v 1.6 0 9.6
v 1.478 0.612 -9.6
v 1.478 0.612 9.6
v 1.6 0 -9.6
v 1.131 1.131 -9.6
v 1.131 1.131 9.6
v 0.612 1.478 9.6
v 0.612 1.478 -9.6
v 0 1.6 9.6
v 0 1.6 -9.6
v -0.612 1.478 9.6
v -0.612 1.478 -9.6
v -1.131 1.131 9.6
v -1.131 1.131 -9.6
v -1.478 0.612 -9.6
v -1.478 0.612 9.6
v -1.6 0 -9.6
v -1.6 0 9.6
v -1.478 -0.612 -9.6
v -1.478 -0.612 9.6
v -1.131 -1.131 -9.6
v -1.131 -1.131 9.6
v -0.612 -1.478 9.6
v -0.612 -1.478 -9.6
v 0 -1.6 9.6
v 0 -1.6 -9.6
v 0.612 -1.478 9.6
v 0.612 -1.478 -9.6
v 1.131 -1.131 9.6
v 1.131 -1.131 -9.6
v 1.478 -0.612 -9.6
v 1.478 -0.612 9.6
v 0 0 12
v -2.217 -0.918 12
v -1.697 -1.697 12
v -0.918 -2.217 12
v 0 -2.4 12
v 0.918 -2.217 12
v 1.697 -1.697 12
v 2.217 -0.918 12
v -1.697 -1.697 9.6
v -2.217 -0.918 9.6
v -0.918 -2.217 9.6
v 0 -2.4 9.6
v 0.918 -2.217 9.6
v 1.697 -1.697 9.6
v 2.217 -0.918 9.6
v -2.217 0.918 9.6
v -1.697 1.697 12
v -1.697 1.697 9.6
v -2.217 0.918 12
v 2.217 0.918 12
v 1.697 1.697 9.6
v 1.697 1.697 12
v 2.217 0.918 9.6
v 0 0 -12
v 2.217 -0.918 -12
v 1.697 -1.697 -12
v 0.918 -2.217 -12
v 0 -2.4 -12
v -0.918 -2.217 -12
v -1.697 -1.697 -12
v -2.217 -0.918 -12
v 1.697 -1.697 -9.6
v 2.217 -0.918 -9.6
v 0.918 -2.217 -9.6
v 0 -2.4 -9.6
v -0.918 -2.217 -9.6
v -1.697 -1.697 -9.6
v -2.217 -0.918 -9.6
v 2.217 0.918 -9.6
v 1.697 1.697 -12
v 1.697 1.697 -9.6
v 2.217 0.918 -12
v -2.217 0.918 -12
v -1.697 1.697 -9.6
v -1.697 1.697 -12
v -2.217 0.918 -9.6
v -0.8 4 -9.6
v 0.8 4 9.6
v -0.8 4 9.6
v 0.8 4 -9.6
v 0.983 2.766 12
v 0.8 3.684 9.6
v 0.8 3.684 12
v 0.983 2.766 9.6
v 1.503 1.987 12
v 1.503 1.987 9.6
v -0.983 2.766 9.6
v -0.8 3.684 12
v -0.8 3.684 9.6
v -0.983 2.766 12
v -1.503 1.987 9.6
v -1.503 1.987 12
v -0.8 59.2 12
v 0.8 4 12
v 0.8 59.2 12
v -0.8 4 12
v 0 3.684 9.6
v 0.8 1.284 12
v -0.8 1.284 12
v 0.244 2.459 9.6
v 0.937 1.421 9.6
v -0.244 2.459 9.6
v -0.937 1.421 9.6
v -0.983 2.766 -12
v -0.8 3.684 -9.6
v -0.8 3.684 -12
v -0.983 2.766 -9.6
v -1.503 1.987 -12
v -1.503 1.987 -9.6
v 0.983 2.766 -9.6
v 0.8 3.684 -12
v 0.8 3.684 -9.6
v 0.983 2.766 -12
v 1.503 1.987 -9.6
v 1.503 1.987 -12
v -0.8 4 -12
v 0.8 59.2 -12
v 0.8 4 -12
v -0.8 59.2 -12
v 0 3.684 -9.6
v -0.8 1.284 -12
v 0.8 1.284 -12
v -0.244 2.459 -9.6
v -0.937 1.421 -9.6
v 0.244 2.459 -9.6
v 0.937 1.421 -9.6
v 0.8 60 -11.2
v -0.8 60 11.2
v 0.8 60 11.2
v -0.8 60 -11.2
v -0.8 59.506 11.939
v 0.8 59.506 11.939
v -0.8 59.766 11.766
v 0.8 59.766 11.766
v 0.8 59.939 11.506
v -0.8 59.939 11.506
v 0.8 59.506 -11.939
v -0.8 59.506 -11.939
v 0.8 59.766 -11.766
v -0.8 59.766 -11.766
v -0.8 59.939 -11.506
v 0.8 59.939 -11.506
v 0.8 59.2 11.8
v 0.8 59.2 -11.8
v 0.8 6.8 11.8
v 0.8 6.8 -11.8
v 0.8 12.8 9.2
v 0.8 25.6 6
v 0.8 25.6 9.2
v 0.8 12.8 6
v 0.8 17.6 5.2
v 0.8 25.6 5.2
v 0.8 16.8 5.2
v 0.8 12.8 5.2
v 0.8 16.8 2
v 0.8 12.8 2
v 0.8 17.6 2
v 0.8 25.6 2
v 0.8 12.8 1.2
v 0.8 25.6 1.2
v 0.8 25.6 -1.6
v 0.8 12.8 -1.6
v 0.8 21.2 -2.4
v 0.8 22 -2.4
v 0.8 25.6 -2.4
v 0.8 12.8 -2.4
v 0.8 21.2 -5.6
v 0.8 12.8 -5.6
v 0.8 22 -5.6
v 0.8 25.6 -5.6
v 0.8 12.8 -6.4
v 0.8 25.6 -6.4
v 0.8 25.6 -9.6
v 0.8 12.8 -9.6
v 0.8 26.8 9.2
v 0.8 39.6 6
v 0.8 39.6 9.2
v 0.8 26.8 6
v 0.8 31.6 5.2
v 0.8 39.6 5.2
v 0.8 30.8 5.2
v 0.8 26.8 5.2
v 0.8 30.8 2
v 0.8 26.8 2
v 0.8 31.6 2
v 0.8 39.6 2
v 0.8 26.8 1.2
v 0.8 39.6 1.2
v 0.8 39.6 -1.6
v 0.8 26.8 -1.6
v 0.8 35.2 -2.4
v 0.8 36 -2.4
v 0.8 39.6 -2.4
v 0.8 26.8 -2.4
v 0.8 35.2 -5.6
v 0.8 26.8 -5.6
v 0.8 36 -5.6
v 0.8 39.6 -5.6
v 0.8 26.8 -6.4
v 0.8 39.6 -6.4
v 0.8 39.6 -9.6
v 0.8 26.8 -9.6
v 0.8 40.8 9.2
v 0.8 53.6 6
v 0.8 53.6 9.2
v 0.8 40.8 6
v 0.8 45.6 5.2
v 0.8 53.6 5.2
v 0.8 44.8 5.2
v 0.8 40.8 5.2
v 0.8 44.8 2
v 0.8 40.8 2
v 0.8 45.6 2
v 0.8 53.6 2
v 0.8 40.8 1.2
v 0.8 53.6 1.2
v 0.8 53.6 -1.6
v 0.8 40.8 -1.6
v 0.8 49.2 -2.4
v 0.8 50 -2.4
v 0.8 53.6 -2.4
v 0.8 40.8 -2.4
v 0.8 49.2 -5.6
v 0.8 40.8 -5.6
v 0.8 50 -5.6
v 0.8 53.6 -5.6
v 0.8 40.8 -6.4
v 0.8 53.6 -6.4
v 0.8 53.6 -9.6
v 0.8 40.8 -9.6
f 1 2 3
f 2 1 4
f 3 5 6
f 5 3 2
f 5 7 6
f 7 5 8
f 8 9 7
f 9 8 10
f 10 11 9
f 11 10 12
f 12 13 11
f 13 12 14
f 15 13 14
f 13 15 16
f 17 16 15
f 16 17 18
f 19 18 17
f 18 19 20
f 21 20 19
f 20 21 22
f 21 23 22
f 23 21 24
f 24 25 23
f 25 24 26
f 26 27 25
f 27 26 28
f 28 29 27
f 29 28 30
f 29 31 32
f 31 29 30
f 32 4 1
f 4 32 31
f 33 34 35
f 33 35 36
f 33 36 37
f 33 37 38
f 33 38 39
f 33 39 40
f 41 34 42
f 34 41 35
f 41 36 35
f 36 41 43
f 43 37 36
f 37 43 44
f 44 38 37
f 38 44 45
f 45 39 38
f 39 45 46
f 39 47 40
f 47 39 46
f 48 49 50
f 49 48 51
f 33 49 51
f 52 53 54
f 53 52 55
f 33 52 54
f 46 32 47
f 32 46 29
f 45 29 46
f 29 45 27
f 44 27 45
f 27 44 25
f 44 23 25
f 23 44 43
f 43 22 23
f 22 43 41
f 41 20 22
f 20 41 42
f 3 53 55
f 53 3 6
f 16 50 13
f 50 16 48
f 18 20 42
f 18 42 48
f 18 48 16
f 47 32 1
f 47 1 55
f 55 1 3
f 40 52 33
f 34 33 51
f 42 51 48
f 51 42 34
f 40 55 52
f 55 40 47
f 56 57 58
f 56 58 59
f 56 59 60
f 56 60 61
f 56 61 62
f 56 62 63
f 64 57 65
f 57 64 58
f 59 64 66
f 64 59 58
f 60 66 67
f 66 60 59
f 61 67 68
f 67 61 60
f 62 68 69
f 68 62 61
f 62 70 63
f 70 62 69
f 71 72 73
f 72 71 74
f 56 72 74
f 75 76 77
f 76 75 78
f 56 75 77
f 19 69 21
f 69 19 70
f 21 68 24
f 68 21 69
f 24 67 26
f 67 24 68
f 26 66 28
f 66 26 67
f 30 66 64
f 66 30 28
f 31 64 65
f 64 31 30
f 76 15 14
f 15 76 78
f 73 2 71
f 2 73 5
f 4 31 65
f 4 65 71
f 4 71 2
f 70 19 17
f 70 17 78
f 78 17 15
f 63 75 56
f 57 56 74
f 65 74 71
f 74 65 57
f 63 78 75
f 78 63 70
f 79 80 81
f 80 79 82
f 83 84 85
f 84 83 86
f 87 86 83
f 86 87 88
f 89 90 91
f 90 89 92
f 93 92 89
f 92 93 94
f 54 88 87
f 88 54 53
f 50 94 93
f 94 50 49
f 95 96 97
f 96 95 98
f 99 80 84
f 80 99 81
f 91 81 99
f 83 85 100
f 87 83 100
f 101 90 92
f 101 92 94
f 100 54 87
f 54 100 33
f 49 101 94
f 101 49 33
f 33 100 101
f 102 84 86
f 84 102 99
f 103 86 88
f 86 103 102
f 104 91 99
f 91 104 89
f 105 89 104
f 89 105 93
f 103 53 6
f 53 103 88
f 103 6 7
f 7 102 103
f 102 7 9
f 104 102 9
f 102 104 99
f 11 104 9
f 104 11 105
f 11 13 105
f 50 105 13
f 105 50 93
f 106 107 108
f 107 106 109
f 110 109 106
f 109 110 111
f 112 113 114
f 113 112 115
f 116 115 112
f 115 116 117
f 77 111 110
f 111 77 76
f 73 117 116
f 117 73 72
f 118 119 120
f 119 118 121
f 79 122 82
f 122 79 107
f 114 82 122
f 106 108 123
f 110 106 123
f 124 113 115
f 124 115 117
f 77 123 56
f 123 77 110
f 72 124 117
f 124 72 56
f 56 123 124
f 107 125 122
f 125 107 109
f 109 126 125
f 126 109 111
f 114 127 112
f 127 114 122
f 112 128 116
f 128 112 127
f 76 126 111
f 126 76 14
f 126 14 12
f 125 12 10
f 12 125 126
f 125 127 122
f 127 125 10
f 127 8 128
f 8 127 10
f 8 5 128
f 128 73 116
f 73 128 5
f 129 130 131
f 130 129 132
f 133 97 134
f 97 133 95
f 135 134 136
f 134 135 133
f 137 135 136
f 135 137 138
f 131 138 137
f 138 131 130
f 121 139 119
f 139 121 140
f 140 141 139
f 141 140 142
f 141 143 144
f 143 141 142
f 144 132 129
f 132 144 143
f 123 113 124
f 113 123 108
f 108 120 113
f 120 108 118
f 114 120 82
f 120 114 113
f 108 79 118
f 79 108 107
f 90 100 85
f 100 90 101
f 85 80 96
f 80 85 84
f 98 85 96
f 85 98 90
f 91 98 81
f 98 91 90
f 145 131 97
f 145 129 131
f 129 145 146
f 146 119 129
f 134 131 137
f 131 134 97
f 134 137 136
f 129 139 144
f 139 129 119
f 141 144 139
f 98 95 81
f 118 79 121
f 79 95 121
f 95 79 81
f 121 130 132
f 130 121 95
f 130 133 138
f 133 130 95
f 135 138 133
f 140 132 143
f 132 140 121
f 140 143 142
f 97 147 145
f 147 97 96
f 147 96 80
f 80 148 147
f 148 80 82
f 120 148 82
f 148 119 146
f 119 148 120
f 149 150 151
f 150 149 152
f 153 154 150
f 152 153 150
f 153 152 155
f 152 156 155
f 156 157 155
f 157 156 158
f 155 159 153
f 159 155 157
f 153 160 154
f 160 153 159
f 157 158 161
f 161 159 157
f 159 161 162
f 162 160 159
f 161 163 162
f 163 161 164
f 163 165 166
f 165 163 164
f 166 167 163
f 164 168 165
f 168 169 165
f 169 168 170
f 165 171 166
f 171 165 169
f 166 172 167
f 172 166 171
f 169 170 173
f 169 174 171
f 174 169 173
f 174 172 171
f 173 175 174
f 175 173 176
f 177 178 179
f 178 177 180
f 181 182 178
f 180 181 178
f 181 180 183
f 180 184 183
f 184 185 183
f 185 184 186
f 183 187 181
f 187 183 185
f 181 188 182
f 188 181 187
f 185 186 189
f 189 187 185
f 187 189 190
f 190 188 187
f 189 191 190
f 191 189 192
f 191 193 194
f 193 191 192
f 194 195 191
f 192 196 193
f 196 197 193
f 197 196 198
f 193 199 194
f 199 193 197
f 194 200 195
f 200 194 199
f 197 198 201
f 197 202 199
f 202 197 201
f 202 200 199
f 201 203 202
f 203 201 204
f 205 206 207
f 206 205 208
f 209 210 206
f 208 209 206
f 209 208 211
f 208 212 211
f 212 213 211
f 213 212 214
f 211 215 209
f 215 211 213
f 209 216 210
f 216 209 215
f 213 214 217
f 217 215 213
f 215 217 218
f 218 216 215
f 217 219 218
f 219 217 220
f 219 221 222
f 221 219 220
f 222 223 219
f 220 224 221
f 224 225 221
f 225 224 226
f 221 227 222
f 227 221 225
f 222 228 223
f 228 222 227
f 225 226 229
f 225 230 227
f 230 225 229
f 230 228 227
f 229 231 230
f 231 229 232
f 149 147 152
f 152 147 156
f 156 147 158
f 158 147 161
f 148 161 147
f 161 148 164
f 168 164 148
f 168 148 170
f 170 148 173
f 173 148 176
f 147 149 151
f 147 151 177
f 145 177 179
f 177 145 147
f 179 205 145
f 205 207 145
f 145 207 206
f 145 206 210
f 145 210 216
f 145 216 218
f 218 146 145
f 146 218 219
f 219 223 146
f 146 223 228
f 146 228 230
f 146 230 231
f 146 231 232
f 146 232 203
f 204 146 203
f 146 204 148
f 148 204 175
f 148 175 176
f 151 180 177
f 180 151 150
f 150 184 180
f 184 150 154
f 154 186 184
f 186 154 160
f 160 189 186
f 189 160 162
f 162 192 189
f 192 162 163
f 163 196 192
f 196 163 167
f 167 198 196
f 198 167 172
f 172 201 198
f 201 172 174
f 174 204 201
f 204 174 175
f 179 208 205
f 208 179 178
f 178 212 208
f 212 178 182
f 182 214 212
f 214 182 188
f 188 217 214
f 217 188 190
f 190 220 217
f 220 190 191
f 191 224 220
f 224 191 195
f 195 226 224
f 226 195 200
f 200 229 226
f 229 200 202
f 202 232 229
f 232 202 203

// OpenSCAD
use <../lib.scad>
use <../p/1-4chrd.scad>
use <s/35252p02s01.scad>
use <s/35252s01.scad>
function ldraw_lib__35252p02() = [
// 0 Flag  8 x  3 with Rod without Reinforced Base and Flat Sides with Metallic Gold Solar Panel Pattern
// 0 Name: 35252p02.dat
// 0 Author: Vincent Messenet [Cheenzo]
// 0 !LDRAW_ORG Part UPDATE 2024-03
// 0 !LICENSE Licensed under CC BY 4.0 : see CAreadme.txt
// 
// 0 BFC CERTIFY CCW
  [0,"BFC","CERTIFY"],
  [0,"BFC","CCW"],
// 
// 0 !KEYWORDS BrickLink 30292pb053, Brickowl 95840, Lunar Space Station
// 0 !KEYWORDS Rebrickable 30292pr9997, Set 60336, Set 60349
// 
// 0 !HISTORY 2024-04-28 [OrionP] Official Update 2024-03
// 
// 
// 1 16 0 0 0 1 0 0 0 1 0 0 0 1 s\35252s01.dat
  [1,16,0,0,0,1,0,0,0,1,0,0,0,1, ldraw_lib__s__35252s01()],
// 
// 3 16 2 -29.5 148 2 -28 150 2 -30 148
  [3,16,2,-29.5,148,2,-28,150,2,-30,148],
// 4 16 2 28 150 2 -28 150 2 -29.5 148 2 29.5 148
  [4,16,2,28,150,2,-28,150,2,-29.5,148,2,29.5,148],
// 3 16 2 29.5 148 2 30 148 2 28 150
  [3,16,2,29.5,148,2,30,148,2,28,150],
// 1 16 2 -28 148 0 -1 0 -2 0 0 0 0 2 1-4chrd.dat
  [1,16,2,-28,148,0,-1,0,-2,0,0,0,0,2, ldraw_lib__1_4chrd()],
// 1 16 2 28 148 0 -1 0 2 0 0 0 0 2 1-4chrd.dat
  [1,16,2,28,148,0,-1,0,2,0,0,0,0,2, ldraw_lib__1_4chrd()],
// 
// 3 16 -2 -30 10 -2 -30 148 -2 -24 10
  [3,16,-2,-30,10,-2,-30,148,-2,-24,10],
// 3 16 -2 30 10 -2 24 10 -2 30 148
  [3,16,-2,30,10,-2,24,10,-2,30,148],
// 4 16 -2 -30 148 -2 30 148 -2 24 10 -2 -24 10
  [4,16,-2,-30,148,-2,30,148,-2,24,10,-2,-24,10],
// 4 16 -2 -30 148 -2 -28 150 -2 28 150 -2 30 148
  [4,16,-2,-30,148,-2,-28,150,-2,28,150,-2,30,148],
// 1 16 -2 -28 148 0 1 0 -2 0 0 0 0 2 1-4chrd.dat
  [1,16,-2,-28,148,0,1,0,-2,0,0,0,0,2, ldraw_lib__1_4chrd()],
// 1 16 -2 28 148 0 1 0 2 0 0 0 0 2 1-4chrd.dat
  [1,16,-2,28,148,0,1,0,2,0,0,0,0,2, ldraw_lib__1_4chrd()],
// 
// 4 16 2 -29.5 17 2 -29.5 148 2 -30 148 2 -30 10
  [4,16,2,-29.5,17,2,-29.5,148,2,-30,148,2,-30,10],
// 3 16 2 -29.5 17 2 -30 10 2 -24 10
  [3,16,2,-29.5,17,2,-30,10,2,-24,10],
// 4 16 2 -29.5 17 2 -24 10 2 24 10 2 29.5 17
  [4,16,2,-29.5,17,2,-24,10,2,24,10,2,29.5,17],
// 3 16 2 30 10 2 29.5 17 2 24 10
  [3,16,2,30,10,2,29.5,17,2,24,10],
// 4 16 2 30 148 2 29.5 148 2 29.5 17 2 30 10
  [4,16,2,30,148,2,29.5,148,2,29.5,17,2,30,10],
// 
// 1 16 2 -23 32 1 0 0 0 1 0 0 0 1 s\35252p02s01.dat
  [1,16,2,-23,32,1,0,0,0,1,0,0,0,1, ldraw_lib__s__35252p02s01()],
// 1 16 2 -23 67 1 0 0 0 1 0 0 0 1 s\35252p02s01.dat
  [1,16,2,-23,67,1,0,0,0,1,0,0,0,1, ldraw_lib__s__35252p02s01()],
// 1 16 2 -23 102 1 0 0 0 1 0 0 0 1 s\35252p02s01.dat
  [1,16,2,-23,102,1,0,0,0,1,0,0,0,1, ldraw_lib__s__35252p02s01()],
// 3 82 2 -23 32 2 -29.5 17 2 -15 32
  [3,82,2,-23,32,2,-29.5,17,2,-15,32],
// 3 82 2 -15 32 2 -29.5 17 2 -13 32
  [3,82,2,-15,32,2,-29.5,17,2,-13,32],
// 3 82 2 -13 32 2 -29.5 17 2 -5 32
  [3,82,2,-13,32,2,-29.5,17,2,-5,32],
// 3 82 2 -5 32 2 -29.5 17 2 -3 32
  [3,82,2,-5,32,2,-29.5,17,2,-3,32],
// 4 82 2 4 32 2 -3 32 2 -29.5 17 2 29.5 17
  [4,82,2,4,32,2,-3,32,2,-29.5,17,2,29.5,17],
// 3 82 2 6 32 2 4 32 2 29.5 17
  [3,82,2,6,32,2,4,32,2,29.5,17],
// 3 82 2 6 32 2 29.5 17 2 14 32
  [3,82,2,6,32,2,29.5,17,2,14,32],
// 3 82 2 14 32 2 29.5 17 2 16 32
  [3,82,2,14,32,2,29.5,17,2,16,32],
// 3 82 2 16 32 2 29.5 17 2 24 32
  [3,82,2,16,32,2,29.5,17,2,24,32],
// 3 82 2 -29.5 17 2 -23 32 2 -23 64
  [3,82,2,-29.5,17,2,-23,32,2,-23,64],
// 3 82 2 -29.5 17 2 -23 64 2 -23 67
  [3,82,2,-29.5,17,2,-23,64,2,-23,67],
// 4 82 2 -29.5 17 2 -23 67 2 -23 99 2 -29.5 148
  [4,82,2,-29.5,17,2,-23,67,2,-23,99,2,-29.5,148],
// 3 82 2 -23 99 2 -23 102 2 -29.5 148
  [3,82,2,-23,99,2,-23,102,2,-29.5,148],
// 3 82 2 -23 102 2 -23 134 2 -29.5 148
  [3,82,2,-23,102,2,-23,134,2,-29.5,148],
// 3 82 2 -29.5 148 2 -23 134 2 -15 134
  [3,82,2,-29.5,148,2,-23,134,2,-15,134],
// 3 82 2 -29.5 148 2 -15 134 2 -13 134
  [3,82,2,-29.5,148,2,-15,134,2,-13,134],
// 3 82 2 -29.5 148 2 -13 134 2 -5 134
  [3,82,2,-29.5,148,2,-13,134,2,-5,134],
// 3 82 2 -29.5 148 2 -5 134 2 -3 134
  [3,82,2,-29.5,148,2,-5,134,2,-3,134],
// 4 82 2 -29.5 148 2 -3 134 2 4 134 2 29.5 148
  [4,82,2,-29.5,148,2,-3,134,2,4,134,2,29.5,148],
// 3 82 2 4 134 2 6 134 2 29.5 148
  [3,82,2,4,134,2,6,134,2,29.5,148],
// 3 82 2 29.5 148 2 6 134 2 14 134
  [3,82,2,29.5,148,2,6,134,2,14,134],
// 3 82 2 29.5 148 2 14 134 2 16 134
  [3,82,2,29.5,148,2,14,134,2,16,134],
// 3 82 2 29.5 148 2 16 134 2 24 134
  [3,82,2,29.5,148,2,16,134,2,24,134],
// 3 82 2 29.5 148 2 24 134 2 24 102
  [3,82,2,29.5,148,2,24,134,2,24,102],
// 3 82 2 29.5 148 2 24 102 2 24 99
  [3,82,2,29.5,148,2,24,102,2,24,99],
// 4 82 2 29.5 148 2 24 99 2 24 67 2 29.5 17
  [4,82,2,29.5,148,2,24,99,2,24,67,2,29.5,17],
// 3 82 2 29.5 17 2 24 67 2 24 64
  [3,82,2,29.5,17,2,24,67,2,24,64],
// 3 82 2 29.5 17 2 24 64 2 24 32
  [3,82,2,29.5,17,2,24,64,2,24,32],
// 4 82 2 -15 67 2 -23 67 2 -23 64 2 -15 64
  [4,82,2,-15,67,2,-23,67,2,-23,64,2,-15,64],
// 4 82 2 -15 67 2 -15 64 2 -13 64 2 -13 67
  [4,82,2,-15,67,2,-15,64,2,-13,64,2,-13,67],
// 4 82 2 -5 67 2 -13 67 2 -13 64 2 -5 64
  [4,82,2,-5,67,2,-13,67,2,-13,64,2,-5,64],
// 4 82 2 -5 67 2 -5 64 2 -3 64 2 -3 67
  [4,82,2,-5,67,2,-5,64,2,-3,64,2,-3,67],
// 4 82 2 4 67 2 -3 67 2 -3 64 2 4 64
  [4,82,2,4,67,2,-3,67,2,-3,64,2,4,64],
// 4 82 2 4 67 2 4 64 2 6 64 2 6 67
  [4,82,2,4,67,2,4,64,2,6,64,2,6,67],
// 4 82 2 14 67 2 6 67 2 6 64 2 14 64
  [4,82,2,14,67,2,6,67,2,6,64,2,14,64],
// 4 82 2 14 67 2 14 64 2 16 64 2 16 67
  [4,82,2,14,67,2,14,64,2,16,64,2,16,67],
// 4 82 2 24 67 2 16 67 2 16 64 2 24 64
  [4,82,2,24,67,2,16,67,2,16,64,2,24,64],
// 4 82 2 -15 99 2 -15 102 2 -23 102 2 -23 99
  [4,82,2,-15,99,2,-15,102,2,-23,102,2,-23,99],
// 4 82 2 -15 102 2 -15 99 2 -13 99 2 -13 102
  [4,82,2,-15,102,2,-15,99,2,-13,99,2,-13,102],
// 4 82 2 -5 102 2 -13 102 2 -13 99 2 -5 99
  [4,82,2,-5,102,2,-13,102,2,-13,99,2,-5,99],
// 4 82 2 -5 102 2 -5 99 2 -3 99 2 -3 102
  [4,82,2,-5,102,2,-5,99,2,-3,99,2,-3,102],
// 4 82 2 4 102 2 -3 102 2 -3 99 2 4 99
  [4,82,2,4,102,2,-3,102,2,-3,99,2,4,99],
// 4 82 2 4 102 2 4 99 2 6 99 2 6 102
  [4,82,2,4,102,2,4,99,2,6,99,2,6,102],
// 4 82 2 14 102 2 6 102 2 6 99 2 14 99
  [4,82,2,14,102,2,6,102,2,6,99,2,14,99],
// 4 82 2 14 102 2 14 99 2 16 99 2 16 102
  [4,82,2,14,102,2,14,99,2,16,99,2,16,102],
// 4 82 2 24 102 2 16 102 2 16 99 2 24 99
  [4,82,2,24,102,2,16,102,2,16,99,2,24,99],
];
module ldraw_lib__35252p02(step=0, col=false, unit=2/5, alt=false, line=0.2, solid=!$preview)
    makepoly(ldraw_lib__35252p02(), step=step, col=col, unit=unit, alt=alt, line=line, solid=solid);
ldraw_lib__35252p02(line=0.2);
